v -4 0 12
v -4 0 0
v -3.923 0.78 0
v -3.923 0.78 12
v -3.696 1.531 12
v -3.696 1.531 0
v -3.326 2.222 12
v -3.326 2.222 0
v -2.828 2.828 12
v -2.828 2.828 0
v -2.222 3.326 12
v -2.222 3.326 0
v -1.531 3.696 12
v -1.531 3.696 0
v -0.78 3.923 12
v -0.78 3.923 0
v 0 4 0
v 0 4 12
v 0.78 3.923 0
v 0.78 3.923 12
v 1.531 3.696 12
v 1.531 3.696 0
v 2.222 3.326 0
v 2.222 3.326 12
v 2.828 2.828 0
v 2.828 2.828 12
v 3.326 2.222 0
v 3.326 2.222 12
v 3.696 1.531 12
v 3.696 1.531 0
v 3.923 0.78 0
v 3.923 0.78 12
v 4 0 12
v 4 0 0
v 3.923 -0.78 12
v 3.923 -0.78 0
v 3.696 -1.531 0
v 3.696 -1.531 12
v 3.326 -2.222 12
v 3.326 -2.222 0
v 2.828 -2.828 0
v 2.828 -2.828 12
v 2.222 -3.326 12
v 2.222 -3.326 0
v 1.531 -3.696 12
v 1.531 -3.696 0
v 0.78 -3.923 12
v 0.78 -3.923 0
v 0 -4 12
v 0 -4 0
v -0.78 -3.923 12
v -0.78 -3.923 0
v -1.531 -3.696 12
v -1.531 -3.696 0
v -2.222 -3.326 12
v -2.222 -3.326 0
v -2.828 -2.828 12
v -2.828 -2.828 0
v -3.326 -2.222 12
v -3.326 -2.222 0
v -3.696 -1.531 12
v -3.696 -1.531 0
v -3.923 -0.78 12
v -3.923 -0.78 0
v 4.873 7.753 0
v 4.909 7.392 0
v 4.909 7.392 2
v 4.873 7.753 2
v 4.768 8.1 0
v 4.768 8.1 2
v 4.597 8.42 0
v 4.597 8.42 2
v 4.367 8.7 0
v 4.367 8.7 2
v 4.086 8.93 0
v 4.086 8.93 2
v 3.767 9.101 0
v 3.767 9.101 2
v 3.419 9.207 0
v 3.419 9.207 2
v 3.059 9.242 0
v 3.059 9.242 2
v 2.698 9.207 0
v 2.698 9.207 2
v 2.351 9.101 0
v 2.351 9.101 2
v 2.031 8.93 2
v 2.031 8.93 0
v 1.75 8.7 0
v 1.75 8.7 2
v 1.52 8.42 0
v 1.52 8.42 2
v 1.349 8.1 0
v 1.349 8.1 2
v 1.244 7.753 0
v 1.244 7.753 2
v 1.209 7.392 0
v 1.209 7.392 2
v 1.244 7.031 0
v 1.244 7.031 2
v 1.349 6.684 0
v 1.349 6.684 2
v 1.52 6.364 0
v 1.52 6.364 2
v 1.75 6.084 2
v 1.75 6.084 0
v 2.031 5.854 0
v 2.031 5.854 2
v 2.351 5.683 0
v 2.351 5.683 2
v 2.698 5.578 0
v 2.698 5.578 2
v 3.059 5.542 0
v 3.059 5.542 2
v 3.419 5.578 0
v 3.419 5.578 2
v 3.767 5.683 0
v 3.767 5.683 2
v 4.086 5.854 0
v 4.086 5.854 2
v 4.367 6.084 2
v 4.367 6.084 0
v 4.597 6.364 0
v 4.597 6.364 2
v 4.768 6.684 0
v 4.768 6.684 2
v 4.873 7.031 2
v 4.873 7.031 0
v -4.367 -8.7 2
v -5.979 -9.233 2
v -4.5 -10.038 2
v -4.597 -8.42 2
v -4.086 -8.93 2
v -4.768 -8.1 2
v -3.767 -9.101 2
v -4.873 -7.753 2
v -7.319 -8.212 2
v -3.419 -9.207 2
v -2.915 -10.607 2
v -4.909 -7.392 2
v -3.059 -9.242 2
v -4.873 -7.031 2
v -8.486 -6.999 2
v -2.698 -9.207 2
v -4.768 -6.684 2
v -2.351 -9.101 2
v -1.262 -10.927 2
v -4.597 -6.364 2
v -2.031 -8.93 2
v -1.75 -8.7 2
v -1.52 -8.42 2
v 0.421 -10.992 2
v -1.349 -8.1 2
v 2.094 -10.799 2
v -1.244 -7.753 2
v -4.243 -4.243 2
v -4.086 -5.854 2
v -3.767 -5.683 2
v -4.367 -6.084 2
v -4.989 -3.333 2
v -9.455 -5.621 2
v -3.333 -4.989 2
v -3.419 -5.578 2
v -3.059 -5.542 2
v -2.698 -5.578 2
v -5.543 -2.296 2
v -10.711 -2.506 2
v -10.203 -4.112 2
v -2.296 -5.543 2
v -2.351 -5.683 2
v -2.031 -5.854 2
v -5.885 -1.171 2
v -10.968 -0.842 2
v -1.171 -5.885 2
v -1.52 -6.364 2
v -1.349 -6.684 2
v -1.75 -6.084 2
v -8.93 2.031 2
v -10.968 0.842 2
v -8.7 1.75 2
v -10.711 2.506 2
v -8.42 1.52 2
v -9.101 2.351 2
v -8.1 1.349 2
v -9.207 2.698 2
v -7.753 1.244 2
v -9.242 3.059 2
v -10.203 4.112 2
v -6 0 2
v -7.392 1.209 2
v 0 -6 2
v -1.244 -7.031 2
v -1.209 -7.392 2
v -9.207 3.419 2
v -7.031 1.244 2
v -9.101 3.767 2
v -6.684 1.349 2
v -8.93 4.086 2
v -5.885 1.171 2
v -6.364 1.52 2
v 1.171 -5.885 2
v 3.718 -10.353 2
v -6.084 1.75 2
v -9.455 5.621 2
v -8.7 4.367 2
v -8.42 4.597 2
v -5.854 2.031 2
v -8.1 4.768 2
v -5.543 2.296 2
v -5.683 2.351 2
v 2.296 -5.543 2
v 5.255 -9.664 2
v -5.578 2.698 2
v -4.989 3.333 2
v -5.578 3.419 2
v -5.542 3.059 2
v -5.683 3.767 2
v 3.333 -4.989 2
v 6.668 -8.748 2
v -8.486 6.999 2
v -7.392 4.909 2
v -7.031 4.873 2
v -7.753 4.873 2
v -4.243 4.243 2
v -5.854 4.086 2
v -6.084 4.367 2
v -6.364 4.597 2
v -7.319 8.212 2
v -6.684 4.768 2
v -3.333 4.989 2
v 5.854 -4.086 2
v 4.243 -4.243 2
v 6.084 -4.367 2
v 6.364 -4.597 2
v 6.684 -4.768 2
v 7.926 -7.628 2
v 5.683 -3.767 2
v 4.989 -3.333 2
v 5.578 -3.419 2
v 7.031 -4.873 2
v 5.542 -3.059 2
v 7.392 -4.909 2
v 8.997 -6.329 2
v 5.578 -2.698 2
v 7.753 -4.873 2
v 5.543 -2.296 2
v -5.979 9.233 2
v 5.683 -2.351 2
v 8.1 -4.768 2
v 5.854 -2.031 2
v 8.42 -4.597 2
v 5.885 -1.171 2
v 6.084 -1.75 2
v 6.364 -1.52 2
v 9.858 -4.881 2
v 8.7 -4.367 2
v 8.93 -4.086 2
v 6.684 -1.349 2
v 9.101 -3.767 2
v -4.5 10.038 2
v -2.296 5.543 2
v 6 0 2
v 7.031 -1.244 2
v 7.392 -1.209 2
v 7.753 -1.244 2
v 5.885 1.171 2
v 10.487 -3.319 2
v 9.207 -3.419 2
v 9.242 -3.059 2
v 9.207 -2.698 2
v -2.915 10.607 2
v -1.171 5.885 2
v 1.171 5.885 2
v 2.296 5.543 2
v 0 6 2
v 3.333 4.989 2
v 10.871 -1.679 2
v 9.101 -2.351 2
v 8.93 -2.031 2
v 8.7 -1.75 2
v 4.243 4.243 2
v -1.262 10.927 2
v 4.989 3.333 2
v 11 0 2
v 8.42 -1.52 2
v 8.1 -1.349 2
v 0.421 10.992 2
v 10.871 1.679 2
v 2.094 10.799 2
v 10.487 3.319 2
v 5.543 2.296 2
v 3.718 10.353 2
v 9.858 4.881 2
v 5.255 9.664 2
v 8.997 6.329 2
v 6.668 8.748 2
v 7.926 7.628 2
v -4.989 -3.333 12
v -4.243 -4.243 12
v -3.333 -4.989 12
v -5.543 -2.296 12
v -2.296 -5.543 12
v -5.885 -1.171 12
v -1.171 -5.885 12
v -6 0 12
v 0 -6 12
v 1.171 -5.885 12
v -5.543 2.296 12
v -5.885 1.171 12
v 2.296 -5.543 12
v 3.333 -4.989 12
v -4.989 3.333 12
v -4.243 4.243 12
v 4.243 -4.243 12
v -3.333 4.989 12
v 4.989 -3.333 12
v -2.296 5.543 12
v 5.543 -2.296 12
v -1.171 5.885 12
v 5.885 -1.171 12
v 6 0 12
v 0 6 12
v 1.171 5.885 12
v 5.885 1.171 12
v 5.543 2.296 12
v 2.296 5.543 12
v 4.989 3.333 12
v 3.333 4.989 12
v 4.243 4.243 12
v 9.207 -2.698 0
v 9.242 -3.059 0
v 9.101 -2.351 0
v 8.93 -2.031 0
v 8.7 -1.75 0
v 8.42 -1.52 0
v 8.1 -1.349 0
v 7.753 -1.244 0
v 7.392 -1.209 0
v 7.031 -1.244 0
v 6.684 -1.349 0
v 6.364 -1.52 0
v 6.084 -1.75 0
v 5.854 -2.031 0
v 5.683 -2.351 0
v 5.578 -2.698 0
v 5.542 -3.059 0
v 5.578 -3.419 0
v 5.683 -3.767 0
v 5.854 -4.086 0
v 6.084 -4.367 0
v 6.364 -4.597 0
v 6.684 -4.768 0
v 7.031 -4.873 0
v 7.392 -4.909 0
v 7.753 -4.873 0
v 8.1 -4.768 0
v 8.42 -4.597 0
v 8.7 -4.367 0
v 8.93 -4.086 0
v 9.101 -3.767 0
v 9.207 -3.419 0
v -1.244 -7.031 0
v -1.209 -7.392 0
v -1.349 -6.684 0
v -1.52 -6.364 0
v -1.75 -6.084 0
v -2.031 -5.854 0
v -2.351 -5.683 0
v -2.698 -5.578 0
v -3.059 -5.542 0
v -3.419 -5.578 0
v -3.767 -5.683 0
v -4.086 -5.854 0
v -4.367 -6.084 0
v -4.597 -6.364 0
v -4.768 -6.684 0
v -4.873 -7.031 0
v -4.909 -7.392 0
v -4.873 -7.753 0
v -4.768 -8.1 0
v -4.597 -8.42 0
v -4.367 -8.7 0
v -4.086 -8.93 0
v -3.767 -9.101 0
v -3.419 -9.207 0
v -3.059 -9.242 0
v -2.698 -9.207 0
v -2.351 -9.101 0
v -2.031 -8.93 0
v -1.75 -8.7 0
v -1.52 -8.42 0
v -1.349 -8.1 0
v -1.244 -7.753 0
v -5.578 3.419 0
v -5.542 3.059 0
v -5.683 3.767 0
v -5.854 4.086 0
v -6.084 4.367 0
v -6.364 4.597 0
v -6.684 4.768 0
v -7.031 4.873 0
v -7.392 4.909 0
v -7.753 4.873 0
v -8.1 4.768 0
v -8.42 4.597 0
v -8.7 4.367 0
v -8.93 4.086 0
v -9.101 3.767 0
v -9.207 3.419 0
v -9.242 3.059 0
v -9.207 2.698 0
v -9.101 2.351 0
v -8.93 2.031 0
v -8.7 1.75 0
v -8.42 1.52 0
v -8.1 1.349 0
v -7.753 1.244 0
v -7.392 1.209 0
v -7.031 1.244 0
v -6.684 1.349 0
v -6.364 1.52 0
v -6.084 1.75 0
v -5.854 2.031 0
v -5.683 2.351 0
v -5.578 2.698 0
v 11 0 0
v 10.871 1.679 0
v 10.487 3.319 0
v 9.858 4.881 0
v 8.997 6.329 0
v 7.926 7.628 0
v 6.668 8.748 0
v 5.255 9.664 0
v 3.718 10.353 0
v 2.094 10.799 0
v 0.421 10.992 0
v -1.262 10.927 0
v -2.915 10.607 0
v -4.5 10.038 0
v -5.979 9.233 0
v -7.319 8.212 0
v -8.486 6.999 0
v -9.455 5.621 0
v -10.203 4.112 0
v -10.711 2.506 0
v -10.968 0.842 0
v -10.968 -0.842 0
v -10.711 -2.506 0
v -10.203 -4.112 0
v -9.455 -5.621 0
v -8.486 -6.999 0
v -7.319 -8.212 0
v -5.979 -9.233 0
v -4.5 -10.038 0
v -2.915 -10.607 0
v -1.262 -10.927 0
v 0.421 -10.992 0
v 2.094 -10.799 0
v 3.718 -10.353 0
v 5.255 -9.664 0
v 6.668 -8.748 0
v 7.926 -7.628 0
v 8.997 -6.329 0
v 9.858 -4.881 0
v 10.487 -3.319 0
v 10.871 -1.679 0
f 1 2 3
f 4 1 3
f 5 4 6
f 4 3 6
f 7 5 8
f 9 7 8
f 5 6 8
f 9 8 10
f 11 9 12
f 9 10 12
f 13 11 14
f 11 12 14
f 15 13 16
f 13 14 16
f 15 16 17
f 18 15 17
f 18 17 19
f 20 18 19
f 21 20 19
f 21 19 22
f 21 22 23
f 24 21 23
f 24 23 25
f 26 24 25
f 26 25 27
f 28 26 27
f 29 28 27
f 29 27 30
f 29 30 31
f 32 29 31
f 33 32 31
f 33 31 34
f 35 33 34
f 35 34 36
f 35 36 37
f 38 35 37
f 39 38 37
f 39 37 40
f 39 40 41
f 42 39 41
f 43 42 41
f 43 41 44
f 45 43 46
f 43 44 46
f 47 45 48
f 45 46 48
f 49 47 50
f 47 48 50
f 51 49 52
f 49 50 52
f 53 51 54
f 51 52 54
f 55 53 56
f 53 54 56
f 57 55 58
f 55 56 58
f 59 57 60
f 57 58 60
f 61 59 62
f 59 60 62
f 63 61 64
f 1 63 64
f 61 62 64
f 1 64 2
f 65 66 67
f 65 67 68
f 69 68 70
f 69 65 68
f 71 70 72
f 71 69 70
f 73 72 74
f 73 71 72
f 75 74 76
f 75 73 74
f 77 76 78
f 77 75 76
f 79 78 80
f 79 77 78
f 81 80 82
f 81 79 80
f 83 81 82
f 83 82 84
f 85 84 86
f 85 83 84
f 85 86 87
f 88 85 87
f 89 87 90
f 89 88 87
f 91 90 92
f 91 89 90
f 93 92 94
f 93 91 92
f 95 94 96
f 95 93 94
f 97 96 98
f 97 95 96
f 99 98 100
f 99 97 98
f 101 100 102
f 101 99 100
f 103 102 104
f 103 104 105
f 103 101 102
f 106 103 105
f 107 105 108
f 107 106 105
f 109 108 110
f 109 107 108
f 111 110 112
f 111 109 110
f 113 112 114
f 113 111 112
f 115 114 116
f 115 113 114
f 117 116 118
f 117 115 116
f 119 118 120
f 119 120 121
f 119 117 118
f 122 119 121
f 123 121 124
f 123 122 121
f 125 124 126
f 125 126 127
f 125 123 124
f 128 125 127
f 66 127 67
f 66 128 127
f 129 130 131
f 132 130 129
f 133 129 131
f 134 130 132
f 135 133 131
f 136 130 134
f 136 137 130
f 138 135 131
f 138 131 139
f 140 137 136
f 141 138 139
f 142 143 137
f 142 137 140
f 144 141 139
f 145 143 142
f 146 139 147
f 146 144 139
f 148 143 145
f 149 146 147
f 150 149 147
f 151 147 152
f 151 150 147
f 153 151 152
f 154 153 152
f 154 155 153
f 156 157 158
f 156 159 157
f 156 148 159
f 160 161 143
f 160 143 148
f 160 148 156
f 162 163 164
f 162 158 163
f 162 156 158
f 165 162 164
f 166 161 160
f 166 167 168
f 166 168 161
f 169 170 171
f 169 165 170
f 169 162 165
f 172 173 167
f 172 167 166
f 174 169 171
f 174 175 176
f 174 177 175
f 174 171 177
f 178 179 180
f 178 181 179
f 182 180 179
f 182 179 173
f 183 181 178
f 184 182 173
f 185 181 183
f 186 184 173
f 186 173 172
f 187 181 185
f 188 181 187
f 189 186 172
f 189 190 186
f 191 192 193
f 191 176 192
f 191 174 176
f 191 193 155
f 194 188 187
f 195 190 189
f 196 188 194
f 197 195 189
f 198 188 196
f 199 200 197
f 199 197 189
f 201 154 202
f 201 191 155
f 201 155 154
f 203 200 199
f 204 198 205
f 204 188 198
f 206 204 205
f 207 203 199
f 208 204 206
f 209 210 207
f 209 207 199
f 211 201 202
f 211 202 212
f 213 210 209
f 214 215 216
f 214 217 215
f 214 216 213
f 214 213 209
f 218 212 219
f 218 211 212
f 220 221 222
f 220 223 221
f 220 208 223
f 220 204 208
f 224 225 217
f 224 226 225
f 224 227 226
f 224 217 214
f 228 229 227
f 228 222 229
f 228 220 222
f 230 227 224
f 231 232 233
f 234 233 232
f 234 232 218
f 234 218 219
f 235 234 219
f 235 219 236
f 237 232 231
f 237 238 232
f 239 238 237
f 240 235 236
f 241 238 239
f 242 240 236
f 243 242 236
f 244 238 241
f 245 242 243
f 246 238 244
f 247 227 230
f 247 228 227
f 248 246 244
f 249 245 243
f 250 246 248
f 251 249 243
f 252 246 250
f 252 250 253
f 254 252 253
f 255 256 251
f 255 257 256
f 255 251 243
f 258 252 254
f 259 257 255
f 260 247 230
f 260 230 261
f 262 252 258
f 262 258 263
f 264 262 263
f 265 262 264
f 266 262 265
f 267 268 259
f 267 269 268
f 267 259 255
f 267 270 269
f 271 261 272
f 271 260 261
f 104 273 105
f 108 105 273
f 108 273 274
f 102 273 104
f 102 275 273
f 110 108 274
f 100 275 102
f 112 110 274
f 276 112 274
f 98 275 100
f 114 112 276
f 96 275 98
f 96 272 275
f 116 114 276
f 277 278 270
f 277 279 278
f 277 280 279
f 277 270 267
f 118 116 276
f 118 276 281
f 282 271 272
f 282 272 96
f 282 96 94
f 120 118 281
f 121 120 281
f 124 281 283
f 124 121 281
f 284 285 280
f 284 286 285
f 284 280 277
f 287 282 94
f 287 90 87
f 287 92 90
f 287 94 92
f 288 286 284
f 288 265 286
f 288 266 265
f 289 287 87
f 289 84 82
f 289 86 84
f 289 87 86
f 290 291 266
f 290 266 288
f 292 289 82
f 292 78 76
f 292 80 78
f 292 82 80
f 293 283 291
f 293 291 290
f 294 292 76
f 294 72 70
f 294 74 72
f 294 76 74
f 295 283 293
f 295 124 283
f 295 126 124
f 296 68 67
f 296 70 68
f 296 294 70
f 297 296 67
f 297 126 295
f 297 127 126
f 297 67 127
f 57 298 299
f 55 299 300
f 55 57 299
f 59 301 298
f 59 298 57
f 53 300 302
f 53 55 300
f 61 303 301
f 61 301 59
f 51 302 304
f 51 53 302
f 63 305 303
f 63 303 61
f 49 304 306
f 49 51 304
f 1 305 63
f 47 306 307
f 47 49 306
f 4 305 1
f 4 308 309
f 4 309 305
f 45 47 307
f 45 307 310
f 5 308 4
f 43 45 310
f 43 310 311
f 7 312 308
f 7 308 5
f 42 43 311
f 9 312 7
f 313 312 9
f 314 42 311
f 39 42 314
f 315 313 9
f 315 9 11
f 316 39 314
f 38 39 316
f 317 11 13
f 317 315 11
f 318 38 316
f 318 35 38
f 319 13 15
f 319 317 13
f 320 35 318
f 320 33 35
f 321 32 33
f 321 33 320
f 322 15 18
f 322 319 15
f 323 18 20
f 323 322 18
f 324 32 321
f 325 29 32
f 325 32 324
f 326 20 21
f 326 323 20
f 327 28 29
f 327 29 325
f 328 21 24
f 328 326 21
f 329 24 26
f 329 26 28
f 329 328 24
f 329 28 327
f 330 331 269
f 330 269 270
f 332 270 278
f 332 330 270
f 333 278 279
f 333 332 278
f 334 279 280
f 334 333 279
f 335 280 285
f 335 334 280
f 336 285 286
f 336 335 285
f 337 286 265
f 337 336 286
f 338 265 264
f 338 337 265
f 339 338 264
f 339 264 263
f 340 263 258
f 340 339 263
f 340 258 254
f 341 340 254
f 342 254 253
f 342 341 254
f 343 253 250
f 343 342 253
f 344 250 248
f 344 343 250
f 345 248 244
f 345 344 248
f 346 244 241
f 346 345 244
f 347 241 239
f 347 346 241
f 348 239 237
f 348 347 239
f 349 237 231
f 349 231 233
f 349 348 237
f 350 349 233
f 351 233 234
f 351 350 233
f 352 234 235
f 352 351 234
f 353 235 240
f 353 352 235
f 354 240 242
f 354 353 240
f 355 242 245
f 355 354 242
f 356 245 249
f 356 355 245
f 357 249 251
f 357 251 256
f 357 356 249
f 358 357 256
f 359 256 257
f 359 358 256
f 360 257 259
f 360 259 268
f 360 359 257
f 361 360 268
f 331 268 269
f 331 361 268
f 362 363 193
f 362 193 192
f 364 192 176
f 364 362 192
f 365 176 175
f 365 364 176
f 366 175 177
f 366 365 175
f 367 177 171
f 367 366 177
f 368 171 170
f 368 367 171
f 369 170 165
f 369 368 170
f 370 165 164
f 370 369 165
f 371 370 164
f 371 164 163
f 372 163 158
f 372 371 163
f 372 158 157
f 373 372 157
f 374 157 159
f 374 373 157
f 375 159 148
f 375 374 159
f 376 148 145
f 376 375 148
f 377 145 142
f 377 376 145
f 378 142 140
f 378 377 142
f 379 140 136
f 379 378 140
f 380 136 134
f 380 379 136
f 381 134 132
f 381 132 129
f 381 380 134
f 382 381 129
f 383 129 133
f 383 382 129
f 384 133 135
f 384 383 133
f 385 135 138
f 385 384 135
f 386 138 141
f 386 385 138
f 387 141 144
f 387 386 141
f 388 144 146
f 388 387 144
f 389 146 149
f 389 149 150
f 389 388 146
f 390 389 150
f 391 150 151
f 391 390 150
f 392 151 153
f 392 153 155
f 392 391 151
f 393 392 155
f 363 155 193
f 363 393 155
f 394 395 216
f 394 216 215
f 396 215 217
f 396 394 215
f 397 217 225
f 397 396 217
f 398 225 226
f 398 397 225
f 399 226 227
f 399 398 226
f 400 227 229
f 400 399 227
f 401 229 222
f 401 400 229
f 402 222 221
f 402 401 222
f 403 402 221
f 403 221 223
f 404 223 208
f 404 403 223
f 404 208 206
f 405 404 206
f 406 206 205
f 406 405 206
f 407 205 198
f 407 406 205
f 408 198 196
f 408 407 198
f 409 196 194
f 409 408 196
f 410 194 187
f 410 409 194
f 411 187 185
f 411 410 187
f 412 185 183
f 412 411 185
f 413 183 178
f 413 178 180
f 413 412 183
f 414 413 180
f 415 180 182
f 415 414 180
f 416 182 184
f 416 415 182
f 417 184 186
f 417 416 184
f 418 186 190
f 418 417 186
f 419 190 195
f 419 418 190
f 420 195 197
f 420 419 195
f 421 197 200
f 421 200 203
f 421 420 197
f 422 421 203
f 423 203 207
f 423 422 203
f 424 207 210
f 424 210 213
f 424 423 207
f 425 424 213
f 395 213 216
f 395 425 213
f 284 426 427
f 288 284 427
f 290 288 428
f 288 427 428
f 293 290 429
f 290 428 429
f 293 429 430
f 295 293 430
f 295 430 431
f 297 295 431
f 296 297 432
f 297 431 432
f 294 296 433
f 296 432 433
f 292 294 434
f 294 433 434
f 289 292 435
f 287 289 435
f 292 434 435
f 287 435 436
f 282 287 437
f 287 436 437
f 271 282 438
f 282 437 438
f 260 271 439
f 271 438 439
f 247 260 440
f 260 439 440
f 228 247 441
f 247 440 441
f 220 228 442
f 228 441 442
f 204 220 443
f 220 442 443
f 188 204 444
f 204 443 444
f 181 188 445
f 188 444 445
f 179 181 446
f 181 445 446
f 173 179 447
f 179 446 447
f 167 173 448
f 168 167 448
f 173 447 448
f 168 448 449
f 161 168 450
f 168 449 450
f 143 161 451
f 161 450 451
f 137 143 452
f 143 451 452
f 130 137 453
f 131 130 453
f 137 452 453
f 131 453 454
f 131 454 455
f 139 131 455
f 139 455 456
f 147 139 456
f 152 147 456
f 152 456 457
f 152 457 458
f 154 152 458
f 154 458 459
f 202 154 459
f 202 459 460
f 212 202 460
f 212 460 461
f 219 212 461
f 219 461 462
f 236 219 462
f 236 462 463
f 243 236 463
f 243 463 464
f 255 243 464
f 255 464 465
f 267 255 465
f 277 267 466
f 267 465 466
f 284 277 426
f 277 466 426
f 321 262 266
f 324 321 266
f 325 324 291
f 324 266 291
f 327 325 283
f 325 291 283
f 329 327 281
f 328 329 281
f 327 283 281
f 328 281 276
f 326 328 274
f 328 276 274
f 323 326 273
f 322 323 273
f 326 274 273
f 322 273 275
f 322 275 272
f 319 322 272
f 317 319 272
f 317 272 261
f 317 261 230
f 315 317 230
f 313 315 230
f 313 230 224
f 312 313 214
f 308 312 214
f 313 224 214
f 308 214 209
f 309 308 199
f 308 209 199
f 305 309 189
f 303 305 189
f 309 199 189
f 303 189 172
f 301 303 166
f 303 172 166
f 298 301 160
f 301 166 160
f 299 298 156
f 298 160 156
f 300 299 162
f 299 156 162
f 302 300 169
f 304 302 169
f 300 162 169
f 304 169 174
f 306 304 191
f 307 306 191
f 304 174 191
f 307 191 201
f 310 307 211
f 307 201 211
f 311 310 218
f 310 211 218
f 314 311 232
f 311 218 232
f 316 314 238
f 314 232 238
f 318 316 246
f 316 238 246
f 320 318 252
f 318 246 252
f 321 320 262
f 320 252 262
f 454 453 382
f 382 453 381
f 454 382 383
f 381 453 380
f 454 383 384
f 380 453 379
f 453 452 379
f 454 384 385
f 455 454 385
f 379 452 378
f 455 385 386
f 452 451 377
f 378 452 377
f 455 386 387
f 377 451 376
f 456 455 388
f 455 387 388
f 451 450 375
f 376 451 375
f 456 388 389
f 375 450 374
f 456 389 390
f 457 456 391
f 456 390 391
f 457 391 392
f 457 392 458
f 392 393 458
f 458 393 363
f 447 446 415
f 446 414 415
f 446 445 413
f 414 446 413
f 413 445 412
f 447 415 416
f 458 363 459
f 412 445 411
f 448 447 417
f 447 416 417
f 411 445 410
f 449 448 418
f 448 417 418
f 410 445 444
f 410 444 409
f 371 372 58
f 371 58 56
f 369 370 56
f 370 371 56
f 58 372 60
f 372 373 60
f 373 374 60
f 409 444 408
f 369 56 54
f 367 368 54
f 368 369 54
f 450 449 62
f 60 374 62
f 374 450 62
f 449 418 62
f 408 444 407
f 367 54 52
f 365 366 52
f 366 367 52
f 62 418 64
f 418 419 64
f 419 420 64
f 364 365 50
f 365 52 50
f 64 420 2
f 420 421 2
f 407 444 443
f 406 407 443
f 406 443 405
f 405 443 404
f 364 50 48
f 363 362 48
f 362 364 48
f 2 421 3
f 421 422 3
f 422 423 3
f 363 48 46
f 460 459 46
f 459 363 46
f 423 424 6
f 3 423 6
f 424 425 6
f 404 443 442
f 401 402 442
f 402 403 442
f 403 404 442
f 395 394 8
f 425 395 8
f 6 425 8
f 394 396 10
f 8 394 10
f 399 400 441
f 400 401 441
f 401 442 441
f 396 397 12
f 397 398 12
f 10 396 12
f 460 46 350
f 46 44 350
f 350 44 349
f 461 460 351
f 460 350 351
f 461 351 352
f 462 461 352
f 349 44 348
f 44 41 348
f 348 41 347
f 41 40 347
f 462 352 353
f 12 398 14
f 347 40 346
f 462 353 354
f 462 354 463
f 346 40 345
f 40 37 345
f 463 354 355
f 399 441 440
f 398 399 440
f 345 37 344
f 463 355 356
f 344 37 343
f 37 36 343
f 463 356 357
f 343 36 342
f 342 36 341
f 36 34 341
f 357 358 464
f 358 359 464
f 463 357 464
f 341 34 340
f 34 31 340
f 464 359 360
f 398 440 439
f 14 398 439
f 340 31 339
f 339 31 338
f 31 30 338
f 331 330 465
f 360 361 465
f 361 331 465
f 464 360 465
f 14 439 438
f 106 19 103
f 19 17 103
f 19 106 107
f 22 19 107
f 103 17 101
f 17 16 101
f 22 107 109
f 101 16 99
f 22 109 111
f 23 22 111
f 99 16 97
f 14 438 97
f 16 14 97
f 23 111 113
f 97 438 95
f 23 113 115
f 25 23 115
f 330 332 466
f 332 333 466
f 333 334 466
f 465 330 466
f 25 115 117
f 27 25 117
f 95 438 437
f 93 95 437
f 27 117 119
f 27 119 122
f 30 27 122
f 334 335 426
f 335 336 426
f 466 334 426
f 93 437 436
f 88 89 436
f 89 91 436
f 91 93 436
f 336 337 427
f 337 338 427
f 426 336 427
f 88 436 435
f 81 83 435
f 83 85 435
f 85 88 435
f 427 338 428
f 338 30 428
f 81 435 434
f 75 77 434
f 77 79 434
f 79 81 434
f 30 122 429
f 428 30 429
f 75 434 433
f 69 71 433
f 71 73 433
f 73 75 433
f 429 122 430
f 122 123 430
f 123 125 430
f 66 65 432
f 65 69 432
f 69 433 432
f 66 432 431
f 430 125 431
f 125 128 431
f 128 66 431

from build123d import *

# Parameters (mm, degrees)
SKETCH1_R           = 11
SKETCH1_R_2         = 1.85
BOSS_EXTRUDE1_DEPTH = 2
SKETCH2_R           = 6
BOSS_EXTRUDE2_DEPTH = 10
SKETCH4_R           = 4
CUT_EXTRUDE1_DEPTH  = 15


with BuildPart() as part:
    # Sketch1 → Boss-Extrude1 (new body)
    with BuildSketch(Plane(origin=(0, 0, 0), x_dir=(0, 1, 0), z_dir=(0, 0, 1))):
        with Locations(Location((0, 0, 0), (0, 0, 270))):
            Circle(SKETCH1_R)
        with Locations(Location((-7.392247164, 3.058542441, 0), (0, 0, 270))):
            Circle(SKETCH1_R_2, mode=Mode.SUBTRACT)
        with Locations(Location((3.058542441, 7.392247164, 0), (0, 0, 270))):
            Circle(SKETCH1_R_2, mode=Mode.SUBTRACT)
        with Locations(Location((7.392247164, -3.058542441, 0), (0, 0, 270))):
            Circle(SKETCH1_R_2, mode=Mode.SUBTRACT)
        with Locations(Location((-3.058542441, -7.392247164, 0), (0, 0, 270))):
            Circle(SKETCH1_R_2, mode=Mode.SUBTRACT)
    extrude(amount=BOSS_EXTRUDE1_DEPTH)

    # Sketch2 → Boss-Extrude2 (add)
    with BuildSketch(Plane.XY.offset(2)):
        Circle(SKETCH2_R)
    extrude(amount=BOSS_EXTRUDE2_DEPTH)

    # Sketch4 → Cut-Extrude1 (cut)
    with BuildSketch(Plane(origin=(0, 0, 0), x_dir=(1, 0, 0), z_dir=(0, 0, -1))):
        with Locations(Location((0, 0, 0), (0, 0, 180))):
            Circle(SKETCH4_R)
    extrude(amount=-CUT_EXTRUDE1_DEPTH, mode=Mode.SUBTRACT)


solid = part.part
